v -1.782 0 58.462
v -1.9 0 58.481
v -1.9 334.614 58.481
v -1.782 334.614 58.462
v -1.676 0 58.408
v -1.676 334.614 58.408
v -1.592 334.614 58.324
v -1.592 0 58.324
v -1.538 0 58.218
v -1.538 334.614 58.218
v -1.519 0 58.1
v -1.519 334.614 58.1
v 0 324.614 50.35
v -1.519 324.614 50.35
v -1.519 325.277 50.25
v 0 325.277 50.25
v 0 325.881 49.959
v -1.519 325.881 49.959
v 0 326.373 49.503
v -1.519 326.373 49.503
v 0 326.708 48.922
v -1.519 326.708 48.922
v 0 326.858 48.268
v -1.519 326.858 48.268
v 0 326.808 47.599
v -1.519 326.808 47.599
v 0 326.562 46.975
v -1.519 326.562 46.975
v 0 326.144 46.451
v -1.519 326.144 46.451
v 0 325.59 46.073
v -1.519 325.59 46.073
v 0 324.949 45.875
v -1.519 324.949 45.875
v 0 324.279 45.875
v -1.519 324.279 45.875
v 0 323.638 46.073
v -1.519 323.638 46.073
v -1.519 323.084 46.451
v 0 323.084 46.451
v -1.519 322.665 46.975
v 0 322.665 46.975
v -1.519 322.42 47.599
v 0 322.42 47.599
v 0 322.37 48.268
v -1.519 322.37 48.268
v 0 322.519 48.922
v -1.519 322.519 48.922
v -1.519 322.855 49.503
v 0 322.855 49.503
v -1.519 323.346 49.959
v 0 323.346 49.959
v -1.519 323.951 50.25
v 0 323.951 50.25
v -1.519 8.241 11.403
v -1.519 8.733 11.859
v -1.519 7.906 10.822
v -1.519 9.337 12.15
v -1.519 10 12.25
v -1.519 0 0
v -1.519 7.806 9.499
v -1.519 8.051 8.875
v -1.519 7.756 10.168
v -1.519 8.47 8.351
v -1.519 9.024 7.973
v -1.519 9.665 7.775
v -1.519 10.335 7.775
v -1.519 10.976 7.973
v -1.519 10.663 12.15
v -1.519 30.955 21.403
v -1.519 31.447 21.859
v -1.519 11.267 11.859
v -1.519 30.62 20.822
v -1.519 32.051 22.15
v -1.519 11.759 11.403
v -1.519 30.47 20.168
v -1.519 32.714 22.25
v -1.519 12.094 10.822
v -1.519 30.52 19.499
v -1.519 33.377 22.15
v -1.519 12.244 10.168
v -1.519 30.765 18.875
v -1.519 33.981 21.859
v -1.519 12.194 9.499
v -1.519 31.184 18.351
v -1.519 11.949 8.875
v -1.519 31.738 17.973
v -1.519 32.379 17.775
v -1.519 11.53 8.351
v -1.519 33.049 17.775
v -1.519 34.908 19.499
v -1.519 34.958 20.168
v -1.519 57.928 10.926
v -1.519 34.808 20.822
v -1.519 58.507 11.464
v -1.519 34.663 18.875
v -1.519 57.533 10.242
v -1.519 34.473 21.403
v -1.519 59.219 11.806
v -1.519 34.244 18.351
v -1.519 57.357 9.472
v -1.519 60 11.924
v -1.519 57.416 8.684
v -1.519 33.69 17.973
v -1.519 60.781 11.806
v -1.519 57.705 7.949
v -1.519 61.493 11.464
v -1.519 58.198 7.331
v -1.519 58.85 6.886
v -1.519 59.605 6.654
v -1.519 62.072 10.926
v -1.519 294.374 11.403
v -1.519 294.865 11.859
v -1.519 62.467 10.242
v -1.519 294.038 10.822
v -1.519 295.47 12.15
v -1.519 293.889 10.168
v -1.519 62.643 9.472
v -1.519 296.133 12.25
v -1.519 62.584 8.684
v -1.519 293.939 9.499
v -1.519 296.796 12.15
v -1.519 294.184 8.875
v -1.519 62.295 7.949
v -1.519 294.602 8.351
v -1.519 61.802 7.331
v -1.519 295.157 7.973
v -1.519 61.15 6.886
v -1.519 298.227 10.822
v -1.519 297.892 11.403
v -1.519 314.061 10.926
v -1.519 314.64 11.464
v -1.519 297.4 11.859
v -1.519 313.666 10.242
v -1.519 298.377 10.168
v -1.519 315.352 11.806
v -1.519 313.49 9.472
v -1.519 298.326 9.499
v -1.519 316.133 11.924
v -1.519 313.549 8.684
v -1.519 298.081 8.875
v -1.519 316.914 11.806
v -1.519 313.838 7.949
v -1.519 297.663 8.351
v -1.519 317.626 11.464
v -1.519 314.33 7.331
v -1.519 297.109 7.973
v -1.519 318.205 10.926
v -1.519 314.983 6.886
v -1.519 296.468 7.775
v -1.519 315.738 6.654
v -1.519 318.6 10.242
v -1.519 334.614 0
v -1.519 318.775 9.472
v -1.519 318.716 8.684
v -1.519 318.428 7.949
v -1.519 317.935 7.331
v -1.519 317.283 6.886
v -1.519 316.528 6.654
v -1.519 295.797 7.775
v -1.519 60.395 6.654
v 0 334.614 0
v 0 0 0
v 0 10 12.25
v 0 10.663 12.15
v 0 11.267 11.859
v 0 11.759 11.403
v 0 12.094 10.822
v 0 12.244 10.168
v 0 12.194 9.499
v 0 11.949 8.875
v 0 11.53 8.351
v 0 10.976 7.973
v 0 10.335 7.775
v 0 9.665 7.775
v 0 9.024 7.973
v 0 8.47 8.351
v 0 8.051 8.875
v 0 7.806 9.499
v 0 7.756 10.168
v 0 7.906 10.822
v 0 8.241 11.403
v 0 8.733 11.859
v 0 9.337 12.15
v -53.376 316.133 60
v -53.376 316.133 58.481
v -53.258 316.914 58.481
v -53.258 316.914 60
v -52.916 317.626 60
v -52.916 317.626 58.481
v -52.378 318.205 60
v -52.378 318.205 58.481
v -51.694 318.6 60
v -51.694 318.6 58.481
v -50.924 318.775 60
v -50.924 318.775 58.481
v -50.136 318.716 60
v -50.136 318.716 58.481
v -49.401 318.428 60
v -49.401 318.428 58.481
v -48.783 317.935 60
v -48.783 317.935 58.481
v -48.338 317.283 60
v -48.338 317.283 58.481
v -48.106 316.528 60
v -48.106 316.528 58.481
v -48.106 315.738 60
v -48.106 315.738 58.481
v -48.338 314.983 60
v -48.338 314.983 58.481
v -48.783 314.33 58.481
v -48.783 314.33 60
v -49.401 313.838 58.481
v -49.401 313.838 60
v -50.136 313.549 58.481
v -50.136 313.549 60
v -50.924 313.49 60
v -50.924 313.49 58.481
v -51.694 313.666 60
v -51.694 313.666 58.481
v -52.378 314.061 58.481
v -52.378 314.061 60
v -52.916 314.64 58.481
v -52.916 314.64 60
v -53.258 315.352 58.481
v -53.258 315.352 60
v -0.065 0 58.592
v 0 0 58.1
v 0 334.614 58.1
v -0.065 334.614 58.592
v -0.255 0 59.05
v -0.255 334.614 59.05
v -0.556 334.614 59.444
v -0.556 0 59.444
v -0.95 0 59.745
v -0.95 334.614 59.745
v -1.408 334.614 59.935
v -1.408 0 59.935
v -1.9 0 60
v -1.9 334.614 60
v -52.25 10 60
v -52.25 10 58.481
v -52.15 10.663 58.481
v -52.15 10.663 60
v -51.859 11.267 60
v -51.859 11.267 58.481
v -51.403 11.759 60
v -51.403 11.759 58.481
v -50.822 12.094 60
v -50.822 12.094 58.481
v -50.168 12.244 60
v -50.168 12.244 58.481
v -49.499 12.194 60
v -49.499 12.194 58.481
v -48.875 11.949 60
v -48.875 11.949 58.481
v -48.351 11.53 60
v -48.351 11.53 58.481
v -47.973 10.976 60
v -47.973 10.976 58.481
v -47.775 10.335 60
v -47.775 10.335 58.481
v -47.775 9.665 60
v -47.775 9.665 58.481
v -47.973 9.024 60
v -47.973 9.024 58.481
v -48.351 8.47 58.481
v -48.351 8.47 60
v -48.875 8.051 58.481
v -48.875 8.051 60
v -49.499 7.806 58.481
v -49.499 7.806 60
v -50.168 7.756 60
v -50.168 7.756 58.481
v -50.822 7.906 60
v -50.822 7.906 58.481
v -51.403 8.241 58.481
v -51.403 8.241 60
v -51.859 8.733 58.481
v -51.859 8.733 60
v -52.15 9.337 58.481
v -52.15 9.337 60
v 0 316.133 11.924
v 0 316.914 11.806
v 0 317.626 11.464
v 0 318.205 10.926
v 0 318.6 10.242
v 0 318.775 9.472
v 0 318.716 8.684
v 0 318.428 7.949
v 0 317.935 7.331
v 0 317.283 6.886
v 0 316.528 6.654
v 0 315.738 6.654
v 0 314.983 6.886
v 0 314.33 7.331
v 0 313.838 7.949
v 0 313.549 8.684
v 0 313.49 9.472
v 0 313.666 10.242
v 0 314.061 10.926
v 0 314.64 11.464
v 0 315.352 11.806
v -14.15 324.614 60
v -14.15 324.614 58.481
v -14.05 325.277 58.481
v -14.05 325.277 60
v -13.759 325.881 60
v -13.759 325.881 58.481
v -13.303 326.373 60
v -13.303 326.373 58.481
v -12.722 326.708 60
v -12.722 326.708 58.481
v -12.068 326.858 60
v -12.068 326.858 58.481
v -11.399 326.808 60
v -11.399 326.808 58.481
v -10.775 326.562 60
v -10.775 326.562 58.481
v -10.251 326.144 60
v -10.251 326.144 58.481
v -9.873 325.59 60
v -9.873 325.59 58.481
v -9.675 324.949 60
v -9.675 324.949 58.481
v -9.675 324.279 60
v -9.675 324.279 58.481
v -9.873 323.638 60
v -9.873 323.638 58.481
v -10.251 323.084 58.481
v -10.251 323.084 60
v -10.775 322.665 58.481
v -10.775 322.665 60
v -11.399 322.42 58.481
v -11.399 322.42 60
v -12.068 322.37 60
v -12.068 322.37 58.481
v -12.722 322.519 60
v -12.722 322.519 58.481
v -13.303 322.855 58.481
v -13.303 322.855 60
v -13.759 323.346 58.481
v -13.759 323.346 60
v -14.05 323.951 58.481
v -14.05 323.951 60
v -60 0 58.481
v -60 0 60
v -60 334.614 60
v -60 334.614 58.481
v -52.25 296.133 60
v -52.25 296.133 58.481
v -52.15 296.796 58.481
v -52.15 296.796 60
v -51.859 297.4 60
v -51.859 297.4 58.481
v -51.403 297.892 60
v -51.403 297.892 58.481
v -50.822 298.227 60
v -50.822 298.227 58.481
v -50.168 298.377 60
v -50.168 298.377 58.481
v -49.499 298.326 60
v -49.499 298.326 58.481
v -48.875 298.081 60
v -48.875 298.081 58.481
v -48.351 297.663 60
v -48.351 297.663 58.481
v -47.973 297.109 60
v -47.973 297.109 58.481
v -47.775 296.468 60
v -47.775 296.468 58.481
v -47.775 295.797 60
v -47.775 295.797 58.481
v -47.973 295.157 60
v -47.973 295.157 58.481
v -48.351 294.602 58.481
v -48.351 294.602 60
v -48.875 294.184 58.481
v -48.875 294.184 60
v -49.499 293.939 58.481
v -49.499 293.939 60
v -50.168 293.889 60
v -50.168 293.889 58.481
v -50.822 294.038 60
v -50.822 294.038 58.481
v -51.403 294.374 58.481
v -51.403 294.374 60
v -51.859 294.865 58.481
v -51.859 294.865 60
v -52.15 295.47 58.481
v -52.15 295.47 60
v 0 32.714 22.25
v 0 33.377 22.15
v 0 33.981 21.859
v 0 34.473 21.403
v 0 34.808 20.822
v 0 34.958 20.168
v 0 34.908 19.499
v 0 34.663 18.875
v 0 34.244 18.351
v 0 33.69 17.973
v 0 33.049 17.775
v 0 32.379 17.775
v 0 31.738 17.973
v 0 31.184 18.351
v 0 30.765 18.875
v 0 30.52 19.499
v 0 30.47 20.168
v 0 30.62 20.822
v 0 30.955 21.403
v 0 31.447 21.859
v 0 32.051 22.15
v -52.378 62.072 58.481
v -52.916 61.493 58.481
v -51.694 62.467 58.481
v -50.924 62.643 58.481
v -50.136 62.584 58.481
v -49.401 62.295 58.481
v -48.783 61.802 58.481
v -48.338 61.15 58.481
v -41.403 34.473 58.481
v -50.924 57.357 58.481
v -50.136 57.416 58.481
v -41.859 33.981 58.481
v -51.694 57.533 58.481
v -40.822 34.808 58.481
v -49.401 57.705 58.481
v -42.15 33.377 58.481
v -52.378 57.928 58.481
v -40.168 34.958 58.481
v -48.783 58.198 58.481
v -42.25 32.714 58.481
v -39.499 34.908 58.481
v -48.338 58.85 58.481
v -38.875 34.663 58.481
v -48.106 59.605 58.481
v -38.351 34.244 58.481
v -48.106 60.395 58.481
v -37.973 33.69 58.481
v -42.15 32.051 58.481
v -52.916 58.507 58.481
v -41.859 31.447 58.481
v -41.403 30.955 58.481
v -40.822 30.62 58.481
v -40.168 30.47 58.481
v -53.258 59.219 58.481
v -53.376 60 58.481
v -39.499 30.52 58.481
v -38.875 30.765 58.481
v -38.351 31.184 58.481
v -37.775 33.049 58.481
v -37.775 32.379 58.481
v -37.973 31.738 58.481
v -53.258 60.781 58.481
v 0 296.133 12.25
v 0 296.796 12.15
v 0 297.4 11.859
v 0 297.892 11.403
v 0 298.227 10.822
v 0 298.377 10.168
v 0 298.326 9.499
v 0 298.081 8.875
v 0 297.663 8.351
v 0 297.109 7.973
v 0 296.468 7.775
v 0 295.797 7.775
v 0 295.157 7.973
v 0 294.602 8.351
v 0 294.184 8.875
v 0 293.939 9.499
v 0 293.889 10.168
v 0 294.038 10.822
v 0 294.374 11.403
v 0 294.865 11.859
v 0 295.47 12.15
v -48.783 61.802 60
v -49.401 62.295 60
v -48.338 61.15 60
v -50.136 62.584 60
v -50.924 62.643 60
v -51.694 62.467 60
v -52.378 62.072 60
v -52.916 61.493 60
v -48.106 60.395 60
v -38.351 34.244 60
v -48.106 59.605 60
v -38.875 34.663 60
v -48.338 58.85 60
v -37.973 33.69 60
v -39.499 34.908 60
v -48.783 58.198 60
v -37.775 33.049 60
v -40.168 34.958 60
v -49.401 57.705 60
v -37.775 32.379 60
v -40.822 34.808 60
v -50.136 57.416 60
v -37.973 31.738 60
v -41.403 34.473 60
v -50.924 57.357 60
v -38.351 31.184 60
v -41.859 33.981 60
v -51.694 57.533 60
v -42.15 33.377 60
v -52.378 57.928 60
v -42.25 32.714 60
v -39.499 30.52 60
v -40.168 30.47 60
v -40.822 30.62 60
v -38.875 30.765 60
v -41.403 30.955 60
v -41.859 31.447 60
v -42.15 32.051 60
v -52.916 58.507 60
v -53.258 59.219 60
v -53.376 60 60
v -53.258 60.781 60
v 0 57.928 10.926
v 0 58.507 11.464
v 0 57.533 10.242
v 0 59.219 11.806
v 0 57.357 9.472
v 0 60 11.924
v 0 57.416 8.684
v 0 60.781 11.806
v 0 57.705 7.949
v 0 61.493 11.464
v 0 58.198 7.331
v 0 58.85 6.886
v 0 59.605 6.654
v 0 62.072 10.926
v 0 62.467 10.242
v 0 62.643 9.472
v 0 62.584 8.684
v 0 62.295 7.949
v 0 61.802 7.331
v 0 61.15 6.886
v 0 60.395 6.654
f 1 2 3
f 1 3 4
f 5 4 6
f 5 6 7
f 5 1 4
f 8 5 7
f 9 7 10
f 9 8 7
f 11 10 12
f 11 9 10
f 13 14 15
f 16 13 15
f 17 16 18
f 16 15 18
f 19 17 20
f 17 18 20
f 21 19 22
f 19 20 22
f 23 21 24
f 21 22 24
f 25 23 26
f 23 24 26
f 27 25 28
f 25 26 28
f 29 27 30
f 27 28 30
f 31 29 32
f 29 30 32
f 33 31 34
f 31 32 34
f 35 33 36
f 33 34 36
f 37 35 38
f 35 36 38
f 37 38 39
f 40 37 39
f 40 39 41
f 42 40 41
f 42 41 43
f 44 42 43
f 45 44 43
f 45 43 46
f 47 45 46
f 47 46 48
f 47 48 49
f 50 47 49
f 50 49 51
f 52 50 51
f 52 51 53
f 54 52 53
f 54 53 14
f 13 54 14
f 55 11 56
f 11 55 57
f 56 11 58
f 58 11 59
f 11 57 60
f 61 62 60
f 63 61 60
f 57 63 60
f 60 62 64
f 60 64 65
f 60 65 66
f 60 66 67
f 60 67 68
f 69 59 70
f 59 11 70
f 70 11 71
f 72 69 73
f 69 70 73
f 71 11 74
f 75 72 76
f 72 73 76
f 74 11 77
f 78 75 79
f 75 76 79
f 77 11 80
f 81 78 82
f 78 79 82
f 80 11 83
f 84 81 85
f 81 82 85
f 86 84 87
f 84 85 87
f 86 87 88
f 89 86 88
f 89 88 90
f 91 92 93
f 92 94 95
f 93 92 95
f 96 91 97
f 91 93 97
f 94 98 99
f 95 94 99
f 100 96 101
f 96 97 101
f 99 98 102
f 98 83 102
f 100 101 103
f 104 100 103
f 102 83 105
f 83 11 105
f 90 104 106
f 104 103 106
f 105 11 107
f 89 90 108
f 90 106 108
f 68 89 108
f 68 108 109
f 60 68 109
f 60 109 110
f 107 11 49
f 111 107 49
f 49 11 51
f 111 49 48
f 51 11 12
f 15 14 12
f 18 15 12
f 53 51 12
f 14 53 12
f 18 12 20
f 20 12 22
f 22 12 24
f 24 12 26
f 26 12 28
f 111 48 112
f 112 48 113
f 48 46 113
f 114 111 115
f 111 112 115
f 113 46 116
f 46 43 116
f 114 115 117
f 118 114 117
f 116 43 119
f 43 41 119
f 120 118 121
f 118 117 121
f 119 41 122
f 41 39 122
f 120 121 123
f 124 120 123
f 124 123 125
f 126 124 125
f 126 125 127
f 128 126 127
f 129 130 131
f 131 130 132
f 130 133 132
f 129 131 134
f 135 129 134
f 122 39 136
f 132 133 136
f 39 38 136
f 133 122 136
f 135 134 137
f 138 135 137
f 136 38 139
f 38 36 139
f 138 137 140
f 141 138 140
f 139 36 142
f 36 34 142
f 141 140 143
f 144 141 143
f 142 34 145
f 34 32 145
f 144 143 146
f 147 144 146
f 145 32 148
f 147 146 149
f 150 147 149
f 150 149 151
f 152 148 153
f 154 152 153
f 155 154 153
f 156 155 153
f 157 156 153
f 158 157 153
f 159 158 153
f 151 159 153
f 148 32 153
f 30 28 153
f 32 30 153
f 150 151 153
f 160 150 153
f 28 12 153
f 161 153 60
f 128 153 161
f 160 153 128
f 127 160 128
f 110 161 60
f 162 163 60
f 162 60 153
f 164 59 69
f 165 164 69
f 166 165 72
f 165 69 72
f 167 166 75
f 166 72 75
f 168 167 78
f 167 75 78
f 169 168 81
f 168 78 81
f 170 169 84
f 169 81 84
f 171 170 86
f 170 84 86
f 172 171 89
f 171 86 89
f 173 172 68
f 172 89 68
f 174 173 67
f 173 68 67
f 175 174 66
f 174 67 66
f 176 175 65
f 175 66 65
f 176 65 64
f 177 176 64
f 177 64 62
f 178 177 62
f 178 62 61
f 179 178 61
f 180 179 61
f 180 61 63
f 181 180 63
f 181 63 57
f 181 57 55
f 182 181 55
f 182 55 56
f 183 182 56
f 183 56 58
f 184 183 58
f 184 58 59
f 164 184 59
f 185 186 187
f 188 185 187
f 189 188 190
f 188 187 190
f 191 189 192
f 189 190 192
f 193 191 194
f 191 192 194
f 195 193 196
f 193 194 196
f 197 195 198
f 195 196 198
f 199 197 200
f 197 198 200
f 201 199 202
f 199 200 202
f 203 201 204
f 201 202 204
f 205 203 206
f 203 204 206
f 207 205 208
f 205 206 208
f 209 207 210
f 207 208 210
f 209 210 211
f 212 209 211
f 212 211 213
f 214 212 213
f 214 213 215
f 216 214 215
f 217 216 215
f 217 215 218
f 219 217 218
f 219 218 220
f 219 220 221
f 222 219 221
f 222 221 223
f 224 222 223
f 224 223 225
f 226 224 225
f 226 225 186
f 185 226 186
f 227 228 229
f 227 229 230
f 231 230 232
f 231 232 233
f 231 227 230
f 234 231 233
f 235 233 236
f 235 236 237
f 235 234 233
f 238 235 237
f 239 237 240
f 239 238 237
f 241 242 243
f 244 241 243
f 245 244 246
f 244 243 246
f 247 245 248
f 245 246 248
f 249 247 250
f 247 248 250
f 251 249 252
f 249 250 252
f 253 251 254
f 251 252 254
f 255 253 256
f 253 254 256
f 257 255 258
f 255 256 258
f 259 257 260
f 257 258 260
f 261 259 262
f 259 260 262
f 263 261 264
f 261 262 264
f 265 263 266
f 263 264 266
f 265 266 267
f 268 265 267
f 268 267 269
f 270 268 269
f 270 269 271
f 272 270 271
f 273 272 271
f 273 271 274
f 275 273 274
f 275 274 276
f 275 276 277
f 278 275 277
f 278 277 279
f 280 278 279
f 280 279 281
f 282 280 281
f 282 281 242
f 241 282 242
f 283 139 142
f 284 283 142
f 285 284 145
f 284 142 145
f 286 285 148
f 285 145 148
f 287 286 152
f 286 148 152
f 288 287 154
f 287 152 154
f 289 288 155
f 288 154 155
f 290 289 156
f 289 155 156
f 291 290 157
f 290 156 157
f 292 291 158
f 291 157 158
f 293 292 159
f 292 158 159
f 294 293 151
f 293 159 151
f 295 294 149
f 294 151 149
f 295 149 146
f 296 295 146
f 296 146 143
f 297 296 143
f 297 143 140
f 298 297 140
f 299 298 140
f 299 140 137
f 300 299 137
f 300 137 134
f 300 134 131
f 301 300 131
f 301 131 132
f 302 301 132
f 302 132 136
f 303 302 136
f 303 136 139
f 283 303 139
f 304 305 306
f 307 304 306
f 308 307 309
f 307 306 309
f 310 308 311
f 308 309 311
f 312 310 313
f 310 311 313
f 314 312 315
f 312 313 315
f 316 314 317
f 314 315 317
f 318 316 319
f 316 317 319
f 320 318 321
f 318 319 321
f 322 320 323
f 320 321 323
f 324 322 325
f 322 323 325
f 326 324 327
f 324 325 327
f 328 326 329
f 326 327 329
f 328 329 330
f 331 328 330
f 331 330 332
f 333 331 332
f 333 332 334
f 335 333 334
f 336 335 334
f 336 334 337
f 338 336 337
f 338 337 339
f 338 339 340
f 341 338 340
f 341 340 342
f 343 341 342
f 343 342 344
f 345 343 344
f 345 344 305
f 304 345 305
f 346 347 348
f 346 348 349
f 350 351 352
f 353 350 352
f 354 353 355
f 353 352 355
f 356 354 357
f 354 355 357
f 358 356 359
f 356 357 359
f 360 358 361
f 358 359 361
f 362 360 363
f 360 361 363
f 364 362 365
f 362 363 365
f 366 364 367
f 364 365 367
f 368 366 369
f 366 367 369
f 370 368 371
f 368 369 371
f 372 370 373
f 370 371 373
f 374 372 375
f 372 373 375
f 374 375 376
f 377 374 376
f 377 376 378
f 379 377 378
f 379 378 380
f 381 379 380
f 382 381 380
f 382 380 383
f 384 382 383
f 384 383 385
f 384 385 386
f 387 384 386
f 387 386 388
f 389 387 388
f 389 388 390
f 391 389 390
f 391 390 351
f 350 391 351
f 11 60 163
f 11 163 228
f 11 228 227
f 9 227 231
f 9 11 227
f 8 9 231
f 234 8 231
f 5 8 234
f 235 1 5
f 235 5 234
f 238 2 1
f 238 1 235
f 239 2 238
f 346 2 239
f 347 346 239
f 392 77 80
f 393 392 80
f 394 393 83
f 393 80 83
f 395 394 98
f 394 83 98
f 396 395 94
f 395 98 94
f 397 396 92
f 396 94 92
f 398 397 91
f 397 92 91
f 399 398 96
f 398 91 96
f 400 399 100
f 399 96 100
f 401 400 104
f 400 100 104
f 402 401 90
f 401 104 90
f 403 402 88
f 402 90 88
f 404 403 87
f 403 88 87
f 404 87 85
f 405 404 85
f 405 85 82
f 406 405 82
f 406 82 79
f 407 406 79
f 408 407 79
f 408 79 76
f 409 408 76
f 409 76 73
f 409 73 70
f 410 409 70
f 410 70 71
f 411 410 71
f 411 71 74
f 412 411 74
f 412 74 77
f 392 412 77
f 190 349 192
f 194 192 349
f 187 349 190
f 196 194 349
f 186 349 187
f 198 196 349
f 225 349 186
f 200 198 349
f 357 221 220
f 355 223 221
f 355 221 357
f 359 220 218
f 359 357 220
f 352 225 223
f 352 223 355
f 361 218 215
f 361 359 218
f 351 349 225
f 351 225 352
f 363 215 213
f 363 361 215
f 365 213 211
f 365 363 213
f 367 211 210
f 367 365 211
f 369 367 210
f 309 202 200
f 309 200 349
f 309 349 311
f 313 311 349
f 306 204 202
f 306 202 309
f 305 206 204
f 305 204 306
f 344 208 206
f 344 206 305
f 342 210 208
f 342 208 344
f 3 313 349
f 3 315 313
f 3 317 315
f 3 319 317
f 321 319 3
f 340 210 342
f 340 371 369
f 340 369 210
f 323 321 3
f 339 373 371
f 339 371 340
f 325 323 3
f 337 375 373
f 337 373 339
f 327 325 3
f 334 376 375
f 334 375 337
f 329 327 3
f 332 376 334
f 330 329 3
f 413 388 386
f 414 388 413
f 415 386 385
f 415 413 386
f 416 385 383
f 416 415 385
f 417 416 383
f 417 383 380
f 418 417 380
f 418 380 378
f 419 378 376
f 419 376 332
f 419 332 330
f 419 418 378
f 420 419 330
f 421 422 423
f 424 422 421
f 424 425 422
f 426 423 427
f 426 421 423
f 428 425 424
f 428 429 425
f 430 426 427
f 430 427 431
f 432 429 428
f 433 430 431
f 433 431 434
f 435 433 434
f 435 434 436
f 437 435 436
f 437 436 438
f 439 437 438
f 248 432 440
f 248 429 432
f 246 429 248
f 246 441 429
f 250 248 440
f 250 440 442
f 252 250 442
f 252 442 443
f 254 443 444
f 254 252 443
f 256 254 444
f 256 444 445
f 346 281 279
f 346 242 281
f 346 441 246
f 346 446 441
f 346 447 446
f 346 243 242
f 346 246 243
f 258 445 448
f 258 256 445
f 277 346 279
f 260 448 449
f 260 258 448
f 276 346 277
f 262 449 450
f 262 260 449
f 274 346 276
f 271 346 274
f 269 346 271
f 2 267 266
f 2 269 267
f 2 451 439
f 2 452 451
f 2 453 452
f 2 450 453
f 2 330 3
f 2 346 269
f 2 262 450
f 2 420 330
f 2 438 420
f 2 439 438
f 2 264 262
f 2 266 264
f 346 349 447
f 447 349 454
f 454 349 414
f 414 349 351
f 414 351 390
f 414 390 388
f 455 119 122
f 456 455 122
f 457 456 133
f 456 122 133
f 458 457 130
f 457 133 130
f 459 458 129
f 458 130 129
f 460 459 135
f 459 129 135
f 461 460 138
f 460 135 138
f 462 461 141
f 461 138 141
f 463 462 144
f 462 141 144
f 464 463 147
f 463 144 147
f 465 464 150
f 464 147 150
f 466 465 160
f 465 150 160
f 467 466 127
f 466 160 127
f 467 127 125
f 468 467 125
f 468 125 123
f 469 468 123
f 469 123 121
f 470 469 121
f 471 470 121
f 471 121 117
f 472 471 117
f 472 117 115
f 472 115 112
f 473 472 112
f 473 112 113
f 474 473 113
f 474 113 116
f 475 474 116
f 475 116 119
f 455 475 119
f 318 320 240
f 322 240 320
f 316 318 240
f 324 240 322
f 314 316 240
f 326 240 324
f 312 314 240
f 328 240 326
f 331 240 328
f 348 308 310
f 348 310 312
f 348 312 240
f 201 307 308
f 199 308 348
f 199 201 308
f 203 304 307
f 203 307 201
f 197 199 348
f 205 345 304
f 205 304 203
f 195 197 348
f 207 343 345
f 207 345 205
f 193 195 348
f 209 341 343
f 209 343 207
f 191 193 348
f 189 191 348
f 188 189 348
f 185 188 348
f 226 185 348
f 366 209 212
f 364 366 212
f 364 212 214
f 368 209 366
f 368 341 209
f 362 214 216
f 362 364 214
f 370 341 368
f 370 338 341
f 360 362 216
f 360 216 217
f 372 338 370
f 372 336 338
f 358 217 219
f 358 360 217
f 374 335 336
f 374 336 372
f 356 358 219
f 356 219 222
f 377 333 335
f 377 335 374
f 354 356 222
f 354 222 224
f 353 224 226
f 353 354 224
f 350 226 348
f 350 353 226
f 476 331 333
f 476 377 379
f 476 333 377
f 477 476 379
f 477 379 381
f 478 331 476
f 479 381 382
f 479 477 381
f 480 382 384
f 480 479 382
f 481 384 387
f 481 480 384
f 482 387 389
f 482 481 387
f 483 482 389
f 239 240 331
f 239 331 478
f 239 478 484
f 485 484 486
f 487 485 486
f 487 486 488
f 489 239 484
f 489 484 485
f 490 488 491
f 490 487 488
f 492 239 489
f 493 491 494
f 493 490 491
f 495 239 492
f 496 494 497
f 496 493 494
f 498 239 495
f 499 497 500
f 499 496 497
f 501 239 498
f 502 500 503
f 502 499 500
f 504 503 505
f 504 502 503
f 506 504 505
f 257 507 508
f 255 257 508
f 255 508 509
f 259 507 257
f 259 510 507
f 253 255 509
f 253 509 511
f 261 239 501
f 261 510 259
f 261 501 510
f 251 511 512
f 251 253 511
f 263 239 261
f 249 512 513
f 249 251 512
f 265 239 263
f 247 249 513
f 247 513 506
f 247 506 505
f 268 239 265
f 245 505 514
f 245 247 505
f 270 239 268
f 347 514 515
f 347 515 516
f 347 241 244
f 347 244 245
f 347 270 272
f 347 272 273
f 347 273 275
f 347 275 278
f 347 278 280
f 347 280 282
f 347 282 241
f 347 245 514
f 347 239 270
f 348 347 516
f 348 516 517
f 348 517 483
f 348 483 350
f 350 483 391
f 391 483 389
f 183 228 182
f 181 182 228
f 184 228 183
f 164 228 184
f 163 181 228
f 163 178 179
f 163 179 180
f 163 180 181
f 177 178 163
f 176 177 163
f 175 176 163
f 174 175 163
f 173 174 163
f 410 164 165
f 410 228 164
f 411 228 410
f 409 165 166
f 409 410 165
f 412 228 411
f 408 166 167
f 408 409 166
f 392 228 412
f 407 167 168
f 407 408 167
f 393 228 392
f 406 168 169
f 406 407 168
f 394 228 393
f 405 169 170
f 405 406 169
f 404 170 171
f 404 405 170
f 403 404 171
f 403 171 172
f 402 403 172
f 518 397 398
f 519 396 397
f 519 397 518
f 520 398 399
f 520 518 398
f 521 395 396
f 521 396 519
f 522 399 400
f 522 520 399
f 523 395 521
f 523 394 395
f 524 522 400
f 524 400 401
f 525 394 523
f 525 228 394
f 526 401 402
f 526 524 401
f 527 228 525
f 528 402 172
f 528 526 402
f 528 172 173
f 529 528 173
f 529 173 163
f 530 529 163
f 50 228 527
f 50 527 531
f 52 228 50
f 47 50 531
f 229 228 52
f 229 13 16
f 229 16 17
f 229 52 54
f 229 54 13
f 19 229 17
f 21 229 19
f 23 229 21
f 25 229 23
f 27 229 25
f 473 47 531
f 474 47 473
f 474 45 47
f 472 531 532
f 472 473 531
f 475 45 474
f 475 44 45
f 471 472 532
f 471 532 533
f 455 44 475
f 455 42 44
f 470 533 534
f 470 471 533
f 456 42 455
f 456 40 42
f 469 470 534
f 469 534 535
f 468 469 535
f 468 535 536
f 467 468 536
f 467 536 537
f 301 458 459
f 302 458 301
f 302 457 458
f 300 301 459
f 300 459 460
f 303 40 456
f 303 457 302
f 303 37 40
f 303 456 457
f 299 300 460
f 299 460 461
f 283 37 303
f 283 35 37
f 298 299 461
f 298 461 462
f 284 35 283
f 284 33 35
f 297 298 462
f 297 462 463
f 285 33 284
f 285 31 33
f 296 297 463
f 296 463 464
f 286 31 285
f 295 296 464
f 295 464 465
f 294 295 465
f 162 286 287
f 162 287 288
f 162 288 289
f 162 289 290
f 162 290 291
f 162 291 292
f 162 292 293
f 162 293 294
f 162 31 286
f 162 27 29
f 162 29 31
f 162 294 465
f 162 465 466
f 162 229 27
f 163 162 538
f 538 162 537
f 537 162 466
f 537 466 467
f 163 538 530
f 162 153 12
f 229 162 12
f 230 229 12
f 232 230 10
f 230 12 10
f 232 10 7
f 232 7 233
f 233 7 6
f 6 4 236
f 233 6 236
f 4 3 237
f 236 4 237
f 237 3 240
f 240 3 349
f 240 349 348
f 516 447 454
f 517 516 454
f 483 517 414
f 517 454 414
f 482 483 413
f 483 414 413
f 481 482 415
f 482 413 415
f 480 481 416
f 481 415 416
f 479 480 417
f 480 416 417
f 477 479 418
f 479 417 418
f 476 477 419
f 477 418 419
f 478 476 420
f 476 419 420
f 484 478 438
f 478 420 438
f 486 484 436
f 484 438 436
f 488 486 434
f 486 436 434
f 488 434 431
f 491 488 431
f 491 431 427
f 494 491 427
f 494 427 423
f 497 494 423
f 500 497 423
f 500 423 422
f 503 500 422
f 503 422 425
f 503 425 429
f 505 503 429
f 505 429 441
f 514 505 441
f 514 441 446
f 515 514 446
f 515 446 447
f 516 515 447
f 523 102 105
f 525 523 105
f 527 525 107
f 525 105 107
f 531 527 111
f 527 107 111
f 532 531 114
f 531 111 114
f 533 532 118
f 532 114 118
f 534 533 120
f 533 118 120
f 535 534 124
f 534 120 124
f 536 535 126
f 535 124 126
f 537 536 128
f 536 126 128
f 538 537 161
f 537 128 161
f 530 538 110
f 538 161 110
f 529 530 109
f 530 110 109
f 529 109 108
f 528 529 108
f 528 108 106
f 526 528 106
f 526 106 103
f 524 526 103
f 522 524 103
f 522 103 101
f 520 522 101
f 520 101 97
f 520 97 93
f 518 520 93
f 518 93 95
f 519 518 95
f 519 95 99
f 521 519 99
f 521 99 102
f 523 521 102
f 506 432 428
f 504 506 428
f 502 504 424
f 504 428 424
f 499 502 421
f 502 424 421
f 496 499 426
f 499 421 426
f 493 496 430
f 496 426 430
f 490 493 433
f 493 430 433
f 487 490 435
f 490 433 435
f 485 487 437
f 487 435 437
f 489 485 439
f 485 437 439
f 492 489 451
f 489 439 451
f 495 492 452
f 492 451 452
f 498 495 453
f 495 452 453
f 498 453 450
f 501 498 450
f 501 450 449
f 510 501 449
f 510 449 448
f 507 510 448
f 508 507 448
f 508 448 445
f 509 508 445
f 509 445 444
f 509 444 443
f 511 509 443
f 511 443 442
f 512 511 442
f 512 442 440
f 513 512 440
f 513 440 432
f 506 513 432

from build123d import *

# Parameters (mm, degrees)
SKETCH1_W                    = 60
SKETCH1_H                    = 334.61392
BASE_FLANGE1_DEPTH           = 1.51892
EDGE_FLANGE1_STRIP_W         = 6.83768
EDGE_FLANGE1_STRIP_H         = 1.51892
EDGE_FLANGE1_STRIP_CUT_DEPTH = 334.61392
EDGE_FLANGE1_DEPTH           = 334.61392
M5_CLEARANCE_HOLE1_D         = 5.3
M5_CLEARANCE_HOLE2_D         = 5.3
M4_CLEARANCE_HOLE1_D         = 4.5
M4_CLEARANCE_HOLE2_D         = 4.5


# Sheet-metal steps are written as plain solids
with BuildPart() as part:
    # Sketch1 → Base-Flange1 (new body)
    with BuildSketch(Plane(origin=(0, 0, 0), x_dir=(0, 0, -1), z_dir=(1, 0, 0))):
        with Locations((-30, 167.30696)):
            Rectangle(SKETCH1_W, SKETCH1_H)
    extrude(amount=-BASE_FLANGE1_DEPTH)

    # Edge-Flange1 strip (across the edge) → Edge-Flange1 strip cut (cut)
    with BuildSketch(Plane(origin=(-1.51892, 0, 60), x_dir=(0, 0, -1), z_dir=(0, 1, 0))):
        with Locations((-1.51892, -0.75946)):
            Rectangle(EDGE_FLANGE1_STRIP_W, EDGE_FLANGE1_STRIP_H)
    extrude(amount=EDGE_FLANGE1_STRIP_CUT_DEPTH, mode=Mode.SUBTRACT)

    # Edge-Flange1 section (across the edge) → Edge-Flange1 (add)
    with BuildSketch(Plane(origin=(-1.51892, 0, 60), x_dir=(0, 0, -1), z_dir=(0, 1, 0))):
        with BuildLine():
            Line((0, 0.381), (0, 58.48108))
            Line((0, 58.48108), (1.51892, 58.48108))
            Line((1.51892, 58.48108), (1.51892, 0.381))
            ThreePointArc((1.51892, 0.381), (1.630512316, 0.111592316), (1.89992, 0))
            Line((1.89992, 0), (1.89992, -1.51892))
            ThreePointArc((1.89992, -1.51892), (0.556473684, -0.962446316), (0, 0.381))
        make_face()
    extrude(amount=EDGE_FLANGE1_DEPTH)

    # M5 Clearance Hole1 (through all)
    with Locations(Plane.XY.offset(60)):
        with Locations((-50.726027, 60), (-50.726027, 316.13284)):
            Hole(M5_CLEARANCE_HOLE1_D / 2)

    # M5 Clearance Hole2 (through all)
    with Locations(Plane(origin=(0, 0, 0), x_dir=(0, 0, -1), z_dir=(1, 0, 0))):
        with Locations((-9.273973, 60), (-9.273973, 316.13284)):
            Hole(M5_CLEARANCE_HOLE2_D / 2)

    # M4 Clearance Hole1 (through all)
    with Locations(Plane.XY.offset(60)):
        with Locations((-50, 296.13284), (-11.89992, 324.61392), (-50, 10), (-40, 32.714)):
            Hole(M4_CLEARANCE_HOLE1_D / 2)

    # M4 Clearance Hole2 (through all)
    with Locations(Plane(origin=(0, 0, 0), x_dir=(0, 0, -1), z_dir=(1, 0, 0))):
        with Locations((-10, 296.13284), (-48.10008, 324.61392), (-10, 10), (-20, 32.714)):
            Hole(M4_CLEARANCE_HOLE2_D / 2)


solid = part.part
